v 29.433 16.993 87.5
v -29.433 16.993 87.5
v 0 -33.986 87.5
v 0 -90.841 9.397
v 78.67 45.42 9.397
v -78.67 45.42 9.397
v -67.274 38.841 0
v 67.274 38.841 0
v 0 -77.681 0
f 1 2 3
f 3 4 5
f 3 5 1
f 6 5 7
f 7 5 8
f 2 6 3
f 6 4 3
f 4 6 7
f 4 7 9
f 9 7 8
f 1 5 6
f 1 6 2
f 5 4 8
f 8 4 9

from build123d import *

# Parameters (mm, degrees)
F1_DEPTH = 87.5
F1_TAPER = 20
F2_SIZE  = 10


with BuildPart() as f1:
    # F0 (on Top) → F1 (new body)
    with BuildSketch(Plane.XY):
        Polygon((84.5943443278, 48.8405674696), (-84.5943443278, 48.8405674696), (0, -97.6811349392), align=None)
    extrude(amount=F1_DEPTH, taper=F1_TAPER)

    # F2
    f2_edges = [f1.edges().sort_by_distance(p)[0] for p in [
        (42.297172, -24.420284, 0),
        (-42.297172, -24.420284, 0),
        (0, 48.840567, 0),
    ]]
    chamfer(f2_edges, length=F2_SIZE)


solid = f1.part
